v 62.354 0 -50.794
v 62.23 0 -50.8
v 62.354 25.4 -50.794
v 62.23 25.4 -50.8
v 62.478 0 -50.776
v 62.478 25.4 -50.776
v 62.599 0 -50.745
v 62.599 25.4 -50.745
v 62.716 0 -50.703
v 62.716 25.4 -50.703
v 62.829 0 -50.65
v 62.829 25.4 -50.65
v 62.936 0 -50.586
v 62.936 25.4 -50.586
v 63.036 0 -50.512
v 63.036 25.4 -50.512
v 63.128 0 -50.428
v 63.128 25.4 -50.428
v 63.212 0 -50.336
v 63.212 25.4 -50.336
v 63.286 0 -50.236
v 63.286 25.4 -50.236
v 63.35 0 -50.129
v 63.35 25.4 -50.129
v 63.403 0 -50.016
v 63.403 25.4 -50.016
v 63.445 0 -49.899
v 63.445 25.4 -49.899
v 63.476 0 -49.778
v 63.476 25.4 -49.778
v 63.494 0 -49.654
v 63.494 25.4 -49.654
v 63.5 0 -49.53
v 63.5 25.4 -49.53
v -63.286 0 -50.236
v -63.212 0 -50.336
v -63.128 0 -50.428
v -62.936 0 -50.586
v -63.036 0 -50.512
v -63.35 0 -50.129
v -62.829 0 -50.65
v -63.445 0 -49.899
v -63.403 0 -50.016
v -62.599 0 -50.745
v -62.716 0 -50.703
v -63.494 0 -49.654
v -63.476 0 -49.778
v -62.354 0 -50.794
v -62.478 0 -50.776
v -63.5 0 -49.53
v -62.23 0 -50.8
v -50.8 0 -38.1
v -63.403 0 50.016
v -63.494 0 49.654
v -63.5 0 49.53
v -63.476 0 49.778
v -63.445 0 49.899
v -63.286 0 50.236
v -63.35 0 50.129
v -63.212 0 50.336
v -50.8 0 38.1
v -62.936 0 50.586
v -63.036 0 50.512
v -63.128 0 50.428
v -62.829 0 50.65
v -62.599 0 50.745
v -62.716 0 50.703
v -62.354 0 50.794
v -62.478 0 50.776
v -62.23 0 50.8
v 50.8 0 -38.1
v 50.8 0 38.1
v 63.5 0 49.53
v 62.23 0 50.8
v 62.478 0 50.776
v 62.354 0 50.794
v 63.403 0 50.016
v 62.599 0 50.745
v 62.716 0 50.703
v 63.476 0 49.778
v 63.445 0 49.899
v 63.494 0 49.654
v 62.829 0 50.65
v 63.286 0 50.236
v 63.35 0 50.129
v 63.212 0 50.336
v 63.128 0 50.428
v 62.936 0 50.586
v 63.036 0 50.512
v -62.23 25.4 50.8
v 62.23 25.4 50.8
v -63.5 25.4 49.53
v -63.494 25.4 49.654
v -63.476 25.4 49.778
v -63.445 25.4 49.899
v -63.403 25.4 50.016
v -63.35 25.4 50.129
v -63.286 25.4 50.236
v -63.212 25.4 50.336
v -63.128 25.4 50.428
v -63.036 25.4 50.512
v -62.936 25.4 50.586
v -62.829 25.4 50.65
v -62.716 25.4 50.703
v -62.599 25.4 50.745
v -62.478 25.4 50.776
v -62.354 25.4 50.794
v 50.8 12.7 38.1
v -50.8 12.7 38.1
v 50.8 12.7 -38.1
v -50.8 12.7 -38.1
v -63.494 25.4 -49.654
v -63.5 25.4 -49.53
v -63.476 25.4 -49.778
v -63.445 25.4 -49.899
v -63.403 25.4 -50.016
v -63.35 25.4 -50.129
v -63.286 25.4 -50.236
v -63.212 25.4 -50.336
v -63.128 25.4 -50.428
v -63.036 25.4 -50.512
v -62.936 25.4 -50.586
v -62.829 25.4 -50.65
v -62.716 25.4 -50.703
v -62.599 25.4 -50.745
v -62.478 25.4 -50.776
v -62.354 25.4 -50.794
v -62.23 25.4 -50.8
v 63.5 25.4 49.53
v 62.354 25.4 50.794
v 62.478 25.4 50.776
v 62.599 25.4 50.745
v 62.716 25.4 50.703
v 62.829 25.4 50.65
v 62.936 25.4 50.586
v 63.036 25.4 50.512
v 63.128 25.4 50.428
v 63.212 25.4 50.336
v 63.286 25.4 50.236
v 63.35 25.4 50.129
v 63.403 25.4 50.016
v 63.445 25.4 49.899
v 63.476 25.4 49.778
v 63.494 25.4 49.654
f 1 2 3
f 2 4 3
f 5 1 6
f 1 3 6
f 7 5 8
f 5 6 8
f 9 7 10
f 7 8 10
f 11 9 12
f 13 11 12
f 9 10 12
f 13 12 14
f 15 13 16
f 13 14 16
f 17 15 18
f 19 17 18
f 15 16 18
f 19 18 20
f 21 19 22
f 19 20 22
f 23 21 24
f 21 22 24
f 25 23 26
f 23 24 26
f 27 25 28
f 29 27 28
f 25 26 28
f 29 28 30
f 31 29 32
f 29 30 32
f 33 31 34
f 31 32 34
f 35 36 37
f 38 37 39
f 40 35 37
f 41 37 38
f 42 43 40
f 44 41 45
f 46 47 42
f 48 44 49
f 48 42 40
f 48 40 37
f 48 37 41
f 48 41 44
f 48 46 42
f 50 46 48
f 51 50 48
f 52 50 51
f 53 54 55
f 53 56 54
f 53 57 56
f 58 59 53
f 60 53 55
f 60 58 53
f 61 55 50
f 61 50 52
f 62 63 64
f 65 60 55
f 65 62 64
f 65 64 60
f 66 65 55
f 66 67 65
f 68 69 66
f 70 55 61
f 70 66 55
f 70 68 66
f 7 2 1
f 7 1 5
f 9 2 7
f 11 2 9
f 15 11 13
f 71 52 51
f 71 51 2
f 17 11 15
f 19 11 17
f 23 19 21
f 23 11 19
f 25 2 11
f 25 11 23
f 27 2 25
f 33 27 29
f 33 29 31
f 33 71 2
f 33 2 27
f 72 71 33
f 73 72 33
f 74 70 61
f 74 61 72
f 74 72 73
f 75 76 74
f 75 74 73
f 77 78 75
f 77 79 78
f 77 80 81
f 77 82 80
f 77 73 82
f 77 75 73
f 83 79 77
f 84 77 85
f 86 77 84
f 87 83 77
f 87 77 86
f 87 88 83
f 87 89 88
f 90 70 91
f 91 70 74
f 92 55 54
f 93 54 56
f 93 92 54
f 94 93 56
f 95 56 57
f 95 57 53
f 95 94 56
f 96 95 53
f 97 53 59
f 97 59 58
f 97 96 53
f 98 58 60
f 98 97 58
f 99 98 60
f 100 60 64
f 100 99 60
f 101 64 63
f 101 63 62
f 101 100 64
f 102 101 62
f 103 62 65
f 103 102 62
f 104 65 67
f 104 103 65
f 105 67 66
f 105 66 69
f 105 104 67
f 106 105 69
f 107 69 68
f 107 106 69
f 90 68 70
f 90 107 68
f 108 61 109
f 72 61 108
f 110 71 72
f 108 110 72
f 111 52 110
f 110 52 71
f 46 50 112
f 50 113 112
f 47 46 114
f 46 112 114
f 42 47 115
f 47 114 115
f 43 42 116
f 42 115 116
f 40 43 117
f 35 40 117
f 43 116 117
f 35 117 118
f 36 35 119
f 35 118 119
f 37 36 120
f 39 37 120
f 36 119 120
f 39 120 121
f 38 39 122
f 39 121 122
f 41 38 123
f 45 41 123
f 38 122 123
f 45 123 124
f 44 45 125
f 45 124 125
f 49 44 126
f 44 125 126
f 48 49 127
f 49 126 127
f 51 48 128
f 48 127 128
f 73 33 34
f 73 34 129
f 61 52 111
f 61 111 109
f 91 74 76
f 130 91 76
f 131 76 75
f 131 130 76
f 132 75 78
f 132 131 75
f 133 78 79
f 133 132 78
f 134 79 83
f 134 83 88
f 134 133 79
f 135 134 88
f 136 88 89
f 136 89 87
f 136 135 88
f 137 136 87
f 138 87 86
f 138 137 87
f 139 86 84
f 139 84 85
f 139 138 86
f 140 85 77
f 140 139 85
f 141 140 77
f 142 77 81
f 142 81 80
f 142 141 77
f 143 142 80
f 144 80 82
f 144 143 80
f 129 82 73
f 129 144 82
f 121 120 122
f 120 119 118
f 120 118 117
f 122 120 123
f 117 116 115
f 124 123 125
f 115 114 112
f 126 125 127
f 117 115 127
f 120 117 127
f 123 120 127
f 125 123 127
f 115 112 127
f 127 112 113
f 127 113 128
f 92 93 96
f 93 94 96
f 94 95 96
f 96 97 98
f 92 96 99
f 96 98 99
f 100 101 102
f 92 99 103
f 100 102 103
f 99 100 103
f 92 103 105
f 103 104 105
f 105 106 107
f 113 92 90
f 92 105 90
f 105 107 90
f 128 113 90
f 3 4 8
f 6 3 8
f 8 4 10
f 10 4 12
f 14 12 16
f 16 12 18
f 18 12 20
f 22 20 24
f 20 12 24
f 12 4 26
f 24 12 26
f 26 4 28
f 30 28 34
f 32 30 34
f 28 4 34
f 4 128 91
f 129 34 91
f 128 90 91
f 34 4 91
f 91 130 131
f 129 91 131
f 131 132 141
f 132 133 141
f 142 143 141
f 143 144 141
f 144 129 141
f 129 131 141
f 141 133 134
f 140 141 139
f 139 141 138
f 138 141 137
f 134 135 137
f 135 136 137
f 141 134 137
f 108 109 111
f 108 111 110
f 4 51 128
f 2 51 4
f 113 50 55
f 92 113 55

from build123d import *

# Parameters (mm, degrees)
F0_W     = 127
F0_H     = 101.6
F0_W_2   = 101.6
F0_H_2   = 76.2
F1_DEPTH = 25.4
F2_DEPTH = 12.7
F3_R     = 1.27


with BuildPart() as f1:
    # F0 (on Front) → F1 (new body)
    with BuildSketch(Plane.XZ):
        Rectangle(F0_W, F0_H)
        Rectangle(F0_W_2, F0_H_2, mode=Mode.SUBTRACT)
        Rectangle(F0_W_2, F0_H_2)
    extrude(amount=-F1_DEPTH)

    # F0 (on Front) → F2 (cut)
    with BuildSketch(Plane.XZ):
        Rectangle(F0_W_2, F0_H_2)
    extrude(amount=-F2_DEPTH, mode=Mode.SUBTRACT)

    # F3
    f3_edges = [f1.edges().sort_by_distance(p)[0] for p in [
        (-63.5, 12.7, 50.8),
        (63.5, 12.7, 50.8),
        (63.5, 12.7, -50.8),
        (-63.5, 12.7, -50.8),
    ]]
    fillet(f3_edges, radius=F3_R)


solid = f1.part
